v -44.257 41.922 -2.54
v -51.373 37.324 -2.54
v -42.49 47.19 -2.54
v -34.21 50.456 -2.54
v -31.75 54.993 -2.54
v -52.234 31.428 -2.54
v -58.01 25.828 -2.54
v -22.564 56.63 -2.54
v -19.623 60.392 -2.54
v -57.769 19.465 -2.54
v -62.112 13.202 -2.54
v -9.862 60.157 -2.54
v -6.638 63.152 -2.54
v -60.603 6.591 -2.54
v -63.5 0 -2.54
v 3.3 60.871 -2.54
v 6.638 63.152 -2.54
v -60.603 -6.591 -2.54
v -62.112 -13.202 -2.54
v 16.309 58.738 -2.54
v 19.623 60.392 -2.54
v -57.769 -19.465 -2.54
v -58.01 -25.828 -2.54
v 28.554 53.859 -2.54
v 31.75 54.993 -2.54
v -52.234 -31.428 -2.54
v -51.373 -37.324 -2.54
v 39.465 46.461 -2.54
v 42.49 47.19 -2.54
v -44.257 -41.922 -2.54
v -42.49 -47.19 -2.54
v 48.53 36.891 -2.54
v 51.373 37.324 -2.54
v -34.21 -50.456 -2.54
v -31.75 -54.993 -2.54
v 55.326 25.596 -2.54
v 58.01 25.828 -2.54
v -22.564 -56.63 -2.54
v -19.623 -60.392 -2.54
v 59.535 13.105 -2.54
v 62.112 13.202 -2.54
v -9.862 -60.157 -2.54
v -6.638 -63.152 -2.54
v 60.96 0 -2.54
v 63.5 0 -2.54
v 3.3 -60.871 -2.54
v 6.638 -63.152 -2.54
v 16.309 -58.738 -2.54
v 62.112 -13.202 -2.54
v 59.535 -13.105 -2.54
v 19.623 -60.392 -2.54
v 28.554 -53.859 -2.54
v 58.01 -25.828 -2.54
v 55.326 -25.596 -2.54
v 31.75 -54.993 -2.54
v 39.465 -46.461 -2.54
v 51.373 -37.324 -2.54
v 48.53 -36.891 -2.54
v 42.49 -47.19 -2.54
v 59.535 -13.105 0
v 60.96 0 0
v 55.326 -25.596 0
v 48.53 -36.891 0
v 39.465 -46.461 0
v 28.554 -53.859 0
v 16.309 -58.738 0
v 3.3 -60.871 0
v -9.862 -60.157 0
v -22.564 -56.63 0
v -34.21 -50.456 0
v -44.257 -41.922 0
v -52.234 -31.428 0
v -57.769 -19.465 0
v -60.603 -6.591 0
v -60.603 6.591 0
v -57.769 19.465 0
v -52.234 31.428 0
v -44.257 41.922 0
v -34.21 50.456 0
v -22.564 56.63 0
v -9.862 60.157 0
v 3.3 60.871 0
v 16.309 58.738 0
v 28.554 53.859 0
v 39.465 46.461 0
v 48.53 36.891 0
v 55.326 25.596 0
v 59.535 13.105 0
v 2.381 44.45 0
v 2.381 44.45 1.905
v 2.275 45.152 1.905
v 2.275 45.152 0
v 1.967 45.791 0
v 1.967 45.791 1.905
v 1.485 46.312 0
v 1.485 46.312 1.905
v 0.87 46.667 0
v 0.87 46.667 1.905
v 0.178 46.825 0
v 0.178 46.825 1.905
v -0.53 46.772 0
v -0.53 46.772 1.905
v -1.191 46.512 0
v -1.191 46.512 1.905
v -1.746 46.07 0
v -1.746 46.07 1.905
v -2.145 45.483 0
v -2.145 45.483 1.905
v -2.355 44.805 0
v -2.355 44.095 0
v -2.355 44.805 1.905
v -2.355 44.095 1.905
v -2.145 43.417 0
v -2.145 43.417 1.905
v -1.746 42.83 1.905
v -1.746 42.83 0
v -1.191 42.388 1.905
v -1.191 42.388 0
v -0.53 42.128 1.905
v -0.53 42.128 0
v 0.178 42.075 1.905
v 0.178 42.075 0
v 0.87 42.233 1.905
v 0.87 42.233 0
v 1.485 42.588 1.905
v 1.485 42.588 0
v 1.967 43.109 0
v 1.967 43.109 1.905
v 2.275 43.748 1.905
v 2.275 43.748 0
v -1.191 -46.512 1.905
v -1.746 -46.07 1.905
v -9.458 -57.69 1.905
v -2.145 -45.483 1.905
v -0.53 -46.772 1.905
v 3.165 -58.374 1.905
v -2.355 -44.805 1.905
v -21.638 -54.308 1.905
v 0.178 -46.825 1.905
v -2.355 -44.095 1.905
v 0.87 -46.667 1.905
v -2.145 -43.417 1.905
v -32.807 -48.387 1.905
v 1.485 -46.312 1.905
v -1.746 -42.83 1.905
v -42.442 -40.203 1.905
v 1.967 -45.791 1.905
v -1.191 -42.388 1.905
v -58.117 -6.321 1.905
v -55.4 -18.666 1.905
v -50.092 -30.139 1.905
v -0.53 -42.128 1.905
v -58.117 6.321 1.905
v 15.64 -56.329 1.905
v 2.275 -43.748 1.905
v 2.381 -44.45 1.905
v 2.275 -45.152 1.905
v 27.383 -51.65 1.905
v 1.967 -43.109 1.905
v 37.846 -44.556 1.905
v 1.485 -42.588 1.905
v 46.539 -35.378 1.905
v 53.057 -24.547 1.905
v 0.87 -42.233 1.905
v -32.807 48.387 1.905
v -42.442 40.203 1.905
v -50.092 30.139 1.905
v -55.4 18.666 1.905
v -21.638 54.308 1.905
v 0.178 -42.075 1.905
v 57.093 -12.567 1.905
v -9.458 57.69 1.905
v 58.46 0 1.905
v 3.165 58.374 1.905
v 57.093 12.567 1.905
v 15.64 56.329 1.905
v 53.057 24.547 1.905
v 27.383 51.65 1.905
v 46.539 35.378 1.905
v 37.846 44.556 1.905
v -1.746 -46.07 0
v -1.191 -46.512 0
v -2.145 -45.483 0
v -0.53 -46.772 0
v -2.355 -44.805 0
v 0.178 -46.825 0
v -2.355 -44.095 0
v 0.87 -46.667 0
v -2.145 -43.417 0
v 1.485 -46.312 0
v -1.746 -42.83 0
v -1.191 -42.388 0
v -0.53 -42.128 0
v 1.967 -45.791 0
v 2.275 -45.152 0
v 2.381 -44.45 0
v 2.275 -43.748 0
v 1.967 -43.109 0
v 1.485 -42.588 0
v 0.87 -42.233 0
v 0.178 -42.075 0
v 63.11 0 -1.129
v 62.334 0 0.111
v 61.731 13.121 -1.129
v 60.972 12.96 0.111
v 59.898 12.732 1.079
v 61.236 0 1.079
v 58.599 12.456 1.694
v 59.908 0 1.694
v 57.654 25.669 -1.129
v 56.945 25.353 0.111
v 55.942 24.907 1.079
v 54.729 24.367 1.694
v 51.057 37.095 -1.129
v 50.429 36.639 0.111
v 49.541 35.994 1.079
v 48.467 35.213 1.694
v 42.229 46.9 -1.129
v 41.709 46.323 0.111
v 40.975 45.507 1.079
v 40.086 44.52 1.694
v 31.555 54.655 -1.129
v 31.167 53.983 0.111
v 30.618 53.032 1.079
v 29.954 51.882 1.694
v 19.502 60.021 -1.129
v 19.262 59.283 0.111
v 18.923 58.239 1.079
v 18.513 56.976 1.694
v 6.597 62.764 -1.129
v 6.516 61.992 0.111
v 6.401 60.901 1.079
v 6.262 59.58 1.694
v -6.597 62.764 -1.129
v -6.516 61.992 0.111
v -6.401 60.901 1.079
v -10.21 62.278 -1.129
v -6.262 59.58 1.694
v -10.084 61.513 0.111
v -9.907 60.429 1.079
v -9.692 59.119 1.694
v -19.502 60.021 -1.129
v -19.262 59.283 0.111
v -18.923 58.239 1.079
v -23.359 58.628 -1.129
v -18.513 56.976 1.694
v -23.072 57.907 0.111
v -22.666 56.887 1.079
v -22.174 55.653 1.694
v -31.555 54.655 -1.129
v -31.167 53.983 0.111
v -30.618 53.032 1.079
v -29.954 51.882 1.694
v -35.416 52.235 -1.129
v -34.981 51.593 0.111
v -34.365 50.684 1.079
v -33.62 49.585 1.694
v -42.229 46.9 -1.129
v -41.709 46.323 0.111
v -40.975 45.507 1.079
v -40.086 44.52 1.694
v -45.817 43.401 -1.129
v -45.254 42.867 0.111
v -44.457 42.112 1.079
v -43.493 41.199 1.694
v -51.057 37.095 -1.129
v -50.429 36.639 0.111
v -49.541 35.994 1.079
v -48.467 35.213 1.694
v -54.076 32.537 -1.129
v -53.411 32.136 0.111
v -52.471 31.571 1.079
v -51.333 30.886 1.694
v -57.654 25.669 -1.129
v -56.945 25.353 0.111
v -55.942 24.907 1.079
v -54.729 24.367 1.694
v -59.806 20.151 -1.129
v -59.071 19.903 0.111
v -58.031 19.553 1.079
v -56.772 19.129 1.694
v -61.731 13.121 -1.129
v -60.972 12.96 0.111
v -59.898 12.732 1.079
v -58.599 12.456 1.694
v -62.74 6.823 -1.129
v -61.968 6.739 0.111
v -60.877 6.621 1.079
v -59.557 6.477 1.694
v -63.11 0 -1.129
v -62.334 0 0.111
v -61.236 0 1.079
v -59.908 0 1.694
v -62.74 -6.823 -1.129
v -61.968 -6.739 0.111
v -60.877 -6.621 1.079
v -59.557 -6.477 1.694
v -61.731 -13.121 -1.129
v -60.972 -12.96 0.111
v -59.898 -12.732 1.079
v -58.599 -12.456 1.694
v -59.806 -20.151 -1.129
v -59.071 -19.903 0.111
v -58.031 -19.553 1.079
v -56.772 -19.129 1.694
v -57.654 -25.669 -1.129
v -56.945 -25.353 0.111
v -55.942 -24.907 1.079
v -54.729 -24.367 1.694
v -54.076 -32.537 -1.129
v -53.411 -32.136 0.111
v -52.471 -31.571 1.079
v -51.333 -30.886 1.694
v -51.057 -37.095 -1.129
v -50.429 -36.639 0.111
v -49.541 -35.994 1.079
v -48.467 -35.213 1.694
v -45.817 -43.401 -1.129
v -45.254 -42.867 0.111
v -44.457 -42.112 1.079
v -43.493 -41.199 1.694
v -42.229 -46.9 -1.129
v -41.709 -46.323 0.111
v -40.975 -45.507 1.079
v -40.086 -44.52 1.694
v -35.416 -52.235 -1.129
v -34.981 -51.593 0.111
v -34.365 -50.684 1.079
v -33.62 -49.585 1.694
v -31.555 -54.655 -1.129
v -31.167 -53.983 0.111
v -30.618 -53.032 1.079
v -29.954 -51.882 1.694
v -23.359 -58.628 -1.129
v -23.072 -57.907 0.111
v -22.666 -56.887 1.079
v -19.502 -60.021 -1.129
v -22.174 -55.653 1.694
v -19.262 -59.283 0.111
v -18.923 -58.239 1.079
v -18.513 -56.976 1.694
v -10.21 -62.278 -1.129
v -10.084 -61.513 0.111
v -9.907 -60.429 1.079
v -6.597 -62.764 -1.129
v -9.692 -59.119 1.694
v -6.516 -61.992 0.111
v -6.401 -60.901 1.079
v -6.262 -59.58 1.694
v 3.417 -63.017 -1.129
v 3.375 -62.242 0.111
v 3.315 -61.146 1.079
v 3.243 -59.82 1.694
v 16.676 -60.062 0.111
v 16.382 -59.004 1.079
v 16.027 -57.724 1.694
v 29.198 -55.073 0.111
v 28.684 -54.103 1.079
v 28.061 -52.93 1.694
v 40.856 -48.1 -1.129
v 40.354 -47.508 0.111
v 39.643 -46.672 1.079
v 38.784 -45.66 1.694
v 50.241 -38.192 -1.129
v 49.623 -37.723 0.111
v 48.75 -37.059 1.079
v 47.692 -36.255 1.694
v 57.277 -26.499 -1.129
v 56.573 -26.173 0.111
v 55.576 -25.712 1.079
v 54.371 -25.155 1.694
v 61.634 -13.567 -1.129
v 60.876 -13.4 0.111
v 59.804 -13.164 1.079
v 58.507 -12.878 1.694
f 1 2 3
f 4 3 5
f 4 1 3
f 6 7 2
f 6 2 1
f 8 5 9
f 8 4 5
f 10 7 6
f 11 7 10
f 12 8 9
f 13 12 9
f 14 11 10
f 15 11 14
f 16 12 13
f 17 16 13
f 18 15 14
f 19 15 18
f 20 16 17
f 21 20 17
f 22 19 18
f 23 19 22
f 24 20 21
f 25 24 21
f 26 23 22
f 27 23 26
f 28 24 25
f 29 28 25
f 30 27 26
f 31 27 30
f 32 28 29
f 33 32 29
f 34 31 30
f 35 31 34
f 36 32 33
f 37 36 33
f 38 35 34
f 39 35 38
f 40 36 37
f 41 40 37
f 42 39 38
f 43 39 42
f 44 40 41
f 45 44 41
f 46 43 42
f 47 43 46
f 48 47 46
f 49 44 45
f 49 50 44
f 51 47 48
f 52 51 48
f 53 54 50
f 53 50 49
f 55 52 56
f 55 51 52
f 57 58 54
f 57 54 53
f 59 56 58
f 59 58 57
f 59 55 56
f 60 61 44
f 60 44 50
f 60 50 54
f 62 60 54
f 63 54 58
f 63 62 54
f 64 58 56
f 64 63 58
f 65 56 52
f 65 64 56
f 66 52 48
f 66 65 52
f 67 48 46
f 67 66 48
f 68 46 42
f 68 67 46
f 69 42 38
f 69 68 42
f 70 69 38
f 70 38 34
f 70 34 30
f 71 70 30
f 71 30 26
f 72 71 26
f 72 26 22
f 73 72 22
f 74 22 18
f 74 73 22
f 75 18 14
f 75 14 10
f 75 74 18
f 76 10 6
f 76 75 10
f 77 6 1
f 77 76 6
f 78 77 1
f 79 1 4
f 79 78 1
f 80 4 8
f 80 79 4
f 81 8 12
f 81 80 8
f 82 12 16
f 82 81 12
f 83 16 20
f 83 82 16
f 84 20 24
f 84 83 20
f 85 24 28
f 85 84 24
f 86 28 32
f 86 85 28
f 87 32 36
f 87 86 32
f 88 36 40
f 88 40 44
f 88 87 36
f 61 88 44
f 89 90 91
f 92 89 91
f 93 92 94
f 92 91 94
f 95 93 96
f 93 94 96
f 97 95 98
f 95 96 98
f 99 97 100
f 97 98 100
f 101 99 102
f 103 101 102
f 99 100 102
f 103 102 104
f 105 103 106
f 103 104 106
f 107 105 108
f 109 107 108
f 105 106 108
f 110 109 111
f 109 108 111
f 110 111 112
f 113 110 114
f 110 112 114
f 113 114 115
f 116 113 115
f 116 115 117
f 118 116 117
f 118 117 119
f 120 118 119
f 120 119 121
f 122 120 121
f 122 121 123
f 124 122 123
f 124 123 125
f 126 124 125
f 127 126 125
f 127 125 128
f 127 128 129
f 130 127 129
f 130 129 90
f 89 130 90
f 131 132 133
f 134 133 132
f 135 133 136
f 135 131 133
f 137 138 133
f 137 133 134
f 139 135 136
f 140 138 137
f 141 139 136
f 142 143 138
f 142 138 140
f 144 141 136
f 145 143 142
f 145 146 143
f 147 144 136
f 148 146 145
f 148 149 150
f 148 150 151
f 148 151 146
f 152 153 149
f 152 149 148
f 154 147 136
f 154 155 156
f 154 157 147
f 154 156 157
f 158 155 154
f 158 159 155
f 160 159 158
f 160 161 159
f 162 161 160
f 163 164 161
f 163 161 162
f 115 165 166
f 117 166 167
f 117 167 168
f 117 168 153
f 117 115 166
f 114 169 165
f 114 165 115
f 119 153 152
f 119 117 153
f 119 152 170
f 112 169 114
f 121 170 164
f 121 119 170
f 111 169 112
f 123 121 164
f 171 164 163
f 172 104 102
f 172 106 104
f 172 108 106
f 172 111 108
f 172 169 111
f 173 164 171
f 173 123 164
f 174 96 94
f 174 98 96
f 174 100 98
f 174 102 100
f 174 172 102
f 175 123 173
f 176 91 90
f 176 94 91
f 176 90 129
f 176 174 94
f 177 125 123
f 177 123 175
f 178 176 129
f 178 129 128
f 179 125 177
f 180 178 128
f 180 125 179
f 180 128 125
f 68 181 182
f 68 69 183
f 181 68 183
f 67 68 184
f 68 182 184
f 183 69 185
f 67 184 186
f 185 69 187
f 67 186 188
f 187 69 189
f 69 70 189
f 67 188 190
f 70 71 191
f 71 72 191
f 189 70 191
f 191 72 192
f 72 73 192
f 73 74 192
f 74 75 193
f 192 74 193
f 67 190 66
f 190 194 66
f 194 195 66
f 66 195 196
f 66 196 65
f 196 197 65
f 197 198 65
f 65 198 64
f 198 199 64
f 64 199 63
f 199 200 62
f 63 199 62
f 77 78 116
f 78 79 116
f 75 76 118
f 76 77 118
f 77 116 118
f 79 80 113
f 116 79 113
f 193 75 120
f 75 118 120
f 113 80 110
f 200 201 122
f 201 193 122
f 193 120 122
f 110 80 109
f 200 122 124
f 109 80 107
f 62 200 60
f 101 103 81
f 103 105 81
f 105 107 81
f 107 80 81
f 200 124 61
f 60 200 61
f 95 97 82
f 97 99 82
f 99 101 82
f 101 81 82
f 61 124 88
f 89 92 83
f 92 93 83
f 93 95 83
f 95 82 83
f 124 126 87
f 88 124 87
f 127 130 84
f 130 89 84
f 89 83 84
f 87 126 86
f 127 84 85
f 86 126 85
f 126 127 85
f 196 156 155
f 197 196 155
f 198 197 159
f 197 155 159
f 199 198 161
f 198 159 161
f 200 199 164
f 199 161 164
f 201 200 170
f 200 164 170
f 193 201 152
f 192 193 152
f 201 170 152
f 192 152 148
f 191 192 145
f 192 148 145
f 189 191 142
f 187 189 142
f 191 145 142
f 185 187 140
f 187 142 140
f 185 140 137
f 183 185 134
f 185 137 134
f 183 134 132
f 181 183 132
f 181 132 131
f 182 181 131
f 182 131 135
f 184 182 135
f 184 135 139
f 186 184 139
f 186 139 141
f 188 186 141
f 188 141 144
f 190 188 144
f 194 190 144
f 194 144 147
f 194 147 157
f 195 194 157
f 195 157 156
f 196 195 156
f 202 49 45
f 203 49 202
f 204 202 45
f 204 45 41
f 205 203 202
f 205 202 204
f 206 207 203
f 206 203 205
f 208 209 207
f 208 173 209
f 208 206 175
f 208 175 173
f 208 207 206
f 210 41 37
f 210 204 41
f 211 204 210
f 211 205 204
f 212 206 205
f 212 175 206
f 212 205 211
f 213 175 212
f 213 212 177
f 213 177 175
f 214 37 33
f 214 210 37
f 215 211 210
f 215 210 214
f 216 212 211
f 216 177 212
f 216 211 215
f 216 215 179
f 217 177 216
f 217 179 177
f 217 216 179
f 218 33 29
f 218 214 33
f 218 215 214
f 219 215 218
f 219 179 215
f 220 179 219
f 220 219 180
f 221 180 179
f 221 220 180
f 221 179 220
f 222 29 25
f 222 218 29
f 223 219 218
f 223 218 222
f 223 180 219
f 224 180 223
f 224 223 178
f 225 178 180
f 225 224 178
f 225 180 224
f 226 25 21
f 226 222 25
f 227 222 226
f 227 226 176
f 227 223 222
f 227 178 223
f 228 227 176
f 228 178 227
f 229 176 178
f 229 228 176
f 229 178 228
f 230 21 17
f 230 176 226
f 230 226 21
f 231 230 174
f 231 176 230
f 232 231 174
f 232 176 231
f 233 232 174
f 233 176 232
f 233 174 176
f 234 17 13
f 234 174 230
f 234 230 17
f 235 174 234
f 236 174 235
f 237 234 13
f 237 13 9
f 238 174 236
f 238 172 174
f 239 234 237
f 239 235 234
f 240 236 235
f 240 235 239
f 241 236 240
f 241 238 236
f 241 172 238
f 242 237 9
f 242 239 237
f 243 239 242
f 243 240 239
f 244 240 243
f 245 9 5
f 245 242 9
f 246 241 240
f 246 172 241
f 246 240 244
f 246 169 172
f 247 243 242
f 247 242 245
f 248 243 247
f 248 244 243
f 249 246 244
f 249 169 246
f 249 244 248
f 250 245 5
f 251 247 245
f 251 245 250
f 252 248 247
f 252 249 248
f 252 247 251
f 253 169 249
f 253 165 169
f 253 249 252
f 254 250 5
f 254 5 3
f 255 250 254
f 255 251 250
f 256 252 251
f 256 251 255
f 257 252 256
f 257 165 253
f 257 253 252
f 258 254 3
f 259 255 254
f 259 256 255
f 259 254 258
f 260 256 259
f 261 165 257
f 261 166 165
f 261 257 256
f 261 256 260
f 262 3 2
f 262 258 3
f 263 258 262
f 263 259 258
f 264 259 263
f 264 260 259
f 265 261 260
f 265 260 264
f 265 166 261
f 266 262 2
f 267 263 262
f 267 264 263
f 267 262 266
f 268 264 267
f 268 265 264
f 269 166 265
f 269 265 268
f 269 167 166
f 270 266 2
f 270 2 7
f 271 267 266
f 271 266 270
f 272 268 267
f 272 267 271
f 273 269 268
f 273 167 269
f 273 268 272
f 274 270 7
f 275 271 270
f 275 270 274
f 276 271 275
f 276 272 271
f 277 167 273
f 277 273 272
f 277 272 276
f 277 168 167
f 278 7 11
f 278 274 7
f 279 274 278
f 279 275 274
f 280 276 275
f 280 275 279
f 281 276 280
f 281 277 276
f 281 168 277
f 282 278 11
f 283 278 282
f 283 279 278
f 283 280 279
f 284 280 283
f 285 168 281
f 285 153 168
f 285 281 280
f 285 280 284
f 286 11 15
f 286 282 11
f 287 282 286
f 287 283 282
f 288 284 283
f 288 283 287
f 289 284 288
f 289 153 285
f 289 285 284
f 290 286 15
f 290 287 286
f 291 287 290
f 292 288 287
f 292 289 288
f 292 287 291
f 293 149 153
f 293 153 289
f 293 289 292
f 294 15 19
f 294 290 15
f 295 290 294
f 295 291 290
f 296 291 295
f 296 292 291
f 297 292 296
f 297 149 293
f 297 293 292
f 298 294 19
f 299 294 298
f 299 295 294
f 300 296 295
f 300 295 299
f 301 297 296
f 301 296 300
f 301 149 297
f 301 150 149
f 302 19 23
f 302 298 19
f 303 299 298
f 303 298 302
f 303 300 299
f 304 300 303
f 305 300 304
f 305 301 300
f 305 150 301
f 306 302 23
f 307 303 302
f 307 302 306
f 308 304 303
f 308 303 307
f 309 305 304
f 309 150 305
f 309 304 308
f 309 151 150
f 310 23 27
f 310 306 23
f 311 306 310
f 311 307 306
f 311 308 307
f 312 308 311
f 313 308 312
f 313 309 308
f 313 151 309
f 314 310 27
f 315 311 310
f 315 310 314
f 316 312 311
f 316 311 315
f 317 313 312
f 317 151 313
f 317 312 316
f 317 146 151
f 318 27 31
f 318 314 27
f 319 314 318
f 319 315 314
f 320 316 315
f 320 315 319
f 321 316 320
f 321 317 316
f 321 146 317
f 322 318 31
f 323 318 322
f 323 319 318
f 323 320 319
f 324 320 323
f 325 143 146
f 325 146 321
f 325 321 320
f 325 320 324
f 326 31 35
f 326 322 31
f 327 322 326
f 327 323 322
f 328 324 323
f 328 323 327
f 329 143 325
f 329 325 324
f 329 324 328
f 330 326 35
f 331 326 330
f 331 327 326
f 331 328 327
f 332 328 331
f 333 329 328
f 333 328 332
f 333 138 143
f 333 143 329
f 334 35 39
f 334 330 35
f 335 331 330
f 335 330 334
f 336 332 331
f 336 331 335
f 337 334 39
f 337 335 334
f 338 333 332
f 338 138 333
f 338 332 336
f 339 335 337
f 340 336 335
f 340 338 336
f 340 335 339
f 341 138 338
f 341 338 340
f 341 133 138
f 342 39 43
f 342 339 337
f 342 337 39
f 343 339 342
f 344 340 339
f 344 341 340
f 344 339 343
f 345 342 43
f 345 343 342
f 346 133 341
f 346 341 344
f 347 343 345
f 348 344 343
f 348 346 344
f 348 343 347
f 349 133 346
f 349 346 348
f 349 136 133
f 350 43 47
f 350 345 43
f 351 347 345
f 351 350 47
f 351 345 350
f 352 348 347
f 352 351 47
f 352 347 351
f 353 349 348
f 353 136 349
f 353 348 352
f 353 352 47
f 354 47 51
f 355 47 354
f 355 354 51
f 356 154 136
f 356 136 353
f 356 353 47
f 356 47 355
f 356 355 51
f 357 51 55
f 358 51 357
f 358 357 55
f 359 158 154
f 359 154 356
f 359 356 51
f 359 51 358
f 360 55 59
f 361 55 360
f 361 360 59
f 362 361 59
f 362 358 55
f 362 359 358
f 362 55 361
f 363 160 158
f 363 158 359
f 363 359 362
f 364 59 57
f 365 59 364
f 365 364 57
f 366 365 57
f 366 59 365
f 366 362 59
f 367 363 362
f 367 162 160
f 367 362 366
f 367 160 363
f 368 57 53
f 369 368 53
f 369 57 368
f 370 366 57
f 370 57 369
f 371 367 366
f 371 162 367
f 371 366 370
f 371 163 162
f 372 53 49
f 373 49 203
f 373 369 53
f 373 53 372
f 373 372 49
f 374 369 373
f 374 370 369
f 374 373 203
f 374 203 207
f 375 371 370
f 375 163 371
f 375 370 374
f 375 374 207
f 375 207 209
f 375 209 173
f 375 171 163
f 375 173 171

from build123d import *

# Parameters (mm, degrees)
F0_R     = 63.5
F1_DEPTH = 1.905
F2_R     = 2.38125
F3_DEPTH = 1.906
F4_R     = 63.5
F4_R_2   = 60.96
F5_DEPTH = 2.54


# Not quite as in the source:
# - a fillet or chamfer that OpenCascade refuses, or shapes differently, is made with other operations: its cross-section is extruded or revolved along the edge and cut away or added


with BuildPart() as f1:
    # F0 (on Top) → F1 (new body)
    with BuildSketch(Plane.XY):
        Circle(F0_R)
    extrude(amount=F1_DEPTH)

    # F2 (on face) → F3 (cut, through all)
    with BuildSketch(Plane.XY.offset(1.905)):
        with Locations((0, 44.45)):
            Circle(F2_R)
        with Locations((0, -44.45)):
            Circle(F2_R)
    extrude(amount=-F3_DEPTH, mode=Mode.SUBTRACT)

    # F4 (on face) → F5 (join)
    with BuildSketch(Plane(origin=(0, 0, 0), x_dir=(1, 0, 0), z_dir=(0, 0, -1))):
        Circle(F4_R)
        Circle(F4_R_2, mode=Mode.SUBTRACT)
    extrude(amount=F5_DEPTH)

    # F6: fillet of radius 5.08 on 1 edges, made by hand

    # F6_s1 → F6_t2 (revolve, cut)
    with BuildSketch(Plane.XZ):
        with BuildLine():
            ThreePointArc((63.5, -2.54), (61.8199479175, 0.635), (58.4598437524, 1.905))
            Line((58.4598437524, 1.905), (63.5, 1.905))
            Line((63.5, 1.905), (63.5, -2.54))
        make_face()
    revolve(axis=Axis((0, 0, 1.905), (0, 0, 1)), mode=Mode.SUBTRACT)


solid = f1.part
